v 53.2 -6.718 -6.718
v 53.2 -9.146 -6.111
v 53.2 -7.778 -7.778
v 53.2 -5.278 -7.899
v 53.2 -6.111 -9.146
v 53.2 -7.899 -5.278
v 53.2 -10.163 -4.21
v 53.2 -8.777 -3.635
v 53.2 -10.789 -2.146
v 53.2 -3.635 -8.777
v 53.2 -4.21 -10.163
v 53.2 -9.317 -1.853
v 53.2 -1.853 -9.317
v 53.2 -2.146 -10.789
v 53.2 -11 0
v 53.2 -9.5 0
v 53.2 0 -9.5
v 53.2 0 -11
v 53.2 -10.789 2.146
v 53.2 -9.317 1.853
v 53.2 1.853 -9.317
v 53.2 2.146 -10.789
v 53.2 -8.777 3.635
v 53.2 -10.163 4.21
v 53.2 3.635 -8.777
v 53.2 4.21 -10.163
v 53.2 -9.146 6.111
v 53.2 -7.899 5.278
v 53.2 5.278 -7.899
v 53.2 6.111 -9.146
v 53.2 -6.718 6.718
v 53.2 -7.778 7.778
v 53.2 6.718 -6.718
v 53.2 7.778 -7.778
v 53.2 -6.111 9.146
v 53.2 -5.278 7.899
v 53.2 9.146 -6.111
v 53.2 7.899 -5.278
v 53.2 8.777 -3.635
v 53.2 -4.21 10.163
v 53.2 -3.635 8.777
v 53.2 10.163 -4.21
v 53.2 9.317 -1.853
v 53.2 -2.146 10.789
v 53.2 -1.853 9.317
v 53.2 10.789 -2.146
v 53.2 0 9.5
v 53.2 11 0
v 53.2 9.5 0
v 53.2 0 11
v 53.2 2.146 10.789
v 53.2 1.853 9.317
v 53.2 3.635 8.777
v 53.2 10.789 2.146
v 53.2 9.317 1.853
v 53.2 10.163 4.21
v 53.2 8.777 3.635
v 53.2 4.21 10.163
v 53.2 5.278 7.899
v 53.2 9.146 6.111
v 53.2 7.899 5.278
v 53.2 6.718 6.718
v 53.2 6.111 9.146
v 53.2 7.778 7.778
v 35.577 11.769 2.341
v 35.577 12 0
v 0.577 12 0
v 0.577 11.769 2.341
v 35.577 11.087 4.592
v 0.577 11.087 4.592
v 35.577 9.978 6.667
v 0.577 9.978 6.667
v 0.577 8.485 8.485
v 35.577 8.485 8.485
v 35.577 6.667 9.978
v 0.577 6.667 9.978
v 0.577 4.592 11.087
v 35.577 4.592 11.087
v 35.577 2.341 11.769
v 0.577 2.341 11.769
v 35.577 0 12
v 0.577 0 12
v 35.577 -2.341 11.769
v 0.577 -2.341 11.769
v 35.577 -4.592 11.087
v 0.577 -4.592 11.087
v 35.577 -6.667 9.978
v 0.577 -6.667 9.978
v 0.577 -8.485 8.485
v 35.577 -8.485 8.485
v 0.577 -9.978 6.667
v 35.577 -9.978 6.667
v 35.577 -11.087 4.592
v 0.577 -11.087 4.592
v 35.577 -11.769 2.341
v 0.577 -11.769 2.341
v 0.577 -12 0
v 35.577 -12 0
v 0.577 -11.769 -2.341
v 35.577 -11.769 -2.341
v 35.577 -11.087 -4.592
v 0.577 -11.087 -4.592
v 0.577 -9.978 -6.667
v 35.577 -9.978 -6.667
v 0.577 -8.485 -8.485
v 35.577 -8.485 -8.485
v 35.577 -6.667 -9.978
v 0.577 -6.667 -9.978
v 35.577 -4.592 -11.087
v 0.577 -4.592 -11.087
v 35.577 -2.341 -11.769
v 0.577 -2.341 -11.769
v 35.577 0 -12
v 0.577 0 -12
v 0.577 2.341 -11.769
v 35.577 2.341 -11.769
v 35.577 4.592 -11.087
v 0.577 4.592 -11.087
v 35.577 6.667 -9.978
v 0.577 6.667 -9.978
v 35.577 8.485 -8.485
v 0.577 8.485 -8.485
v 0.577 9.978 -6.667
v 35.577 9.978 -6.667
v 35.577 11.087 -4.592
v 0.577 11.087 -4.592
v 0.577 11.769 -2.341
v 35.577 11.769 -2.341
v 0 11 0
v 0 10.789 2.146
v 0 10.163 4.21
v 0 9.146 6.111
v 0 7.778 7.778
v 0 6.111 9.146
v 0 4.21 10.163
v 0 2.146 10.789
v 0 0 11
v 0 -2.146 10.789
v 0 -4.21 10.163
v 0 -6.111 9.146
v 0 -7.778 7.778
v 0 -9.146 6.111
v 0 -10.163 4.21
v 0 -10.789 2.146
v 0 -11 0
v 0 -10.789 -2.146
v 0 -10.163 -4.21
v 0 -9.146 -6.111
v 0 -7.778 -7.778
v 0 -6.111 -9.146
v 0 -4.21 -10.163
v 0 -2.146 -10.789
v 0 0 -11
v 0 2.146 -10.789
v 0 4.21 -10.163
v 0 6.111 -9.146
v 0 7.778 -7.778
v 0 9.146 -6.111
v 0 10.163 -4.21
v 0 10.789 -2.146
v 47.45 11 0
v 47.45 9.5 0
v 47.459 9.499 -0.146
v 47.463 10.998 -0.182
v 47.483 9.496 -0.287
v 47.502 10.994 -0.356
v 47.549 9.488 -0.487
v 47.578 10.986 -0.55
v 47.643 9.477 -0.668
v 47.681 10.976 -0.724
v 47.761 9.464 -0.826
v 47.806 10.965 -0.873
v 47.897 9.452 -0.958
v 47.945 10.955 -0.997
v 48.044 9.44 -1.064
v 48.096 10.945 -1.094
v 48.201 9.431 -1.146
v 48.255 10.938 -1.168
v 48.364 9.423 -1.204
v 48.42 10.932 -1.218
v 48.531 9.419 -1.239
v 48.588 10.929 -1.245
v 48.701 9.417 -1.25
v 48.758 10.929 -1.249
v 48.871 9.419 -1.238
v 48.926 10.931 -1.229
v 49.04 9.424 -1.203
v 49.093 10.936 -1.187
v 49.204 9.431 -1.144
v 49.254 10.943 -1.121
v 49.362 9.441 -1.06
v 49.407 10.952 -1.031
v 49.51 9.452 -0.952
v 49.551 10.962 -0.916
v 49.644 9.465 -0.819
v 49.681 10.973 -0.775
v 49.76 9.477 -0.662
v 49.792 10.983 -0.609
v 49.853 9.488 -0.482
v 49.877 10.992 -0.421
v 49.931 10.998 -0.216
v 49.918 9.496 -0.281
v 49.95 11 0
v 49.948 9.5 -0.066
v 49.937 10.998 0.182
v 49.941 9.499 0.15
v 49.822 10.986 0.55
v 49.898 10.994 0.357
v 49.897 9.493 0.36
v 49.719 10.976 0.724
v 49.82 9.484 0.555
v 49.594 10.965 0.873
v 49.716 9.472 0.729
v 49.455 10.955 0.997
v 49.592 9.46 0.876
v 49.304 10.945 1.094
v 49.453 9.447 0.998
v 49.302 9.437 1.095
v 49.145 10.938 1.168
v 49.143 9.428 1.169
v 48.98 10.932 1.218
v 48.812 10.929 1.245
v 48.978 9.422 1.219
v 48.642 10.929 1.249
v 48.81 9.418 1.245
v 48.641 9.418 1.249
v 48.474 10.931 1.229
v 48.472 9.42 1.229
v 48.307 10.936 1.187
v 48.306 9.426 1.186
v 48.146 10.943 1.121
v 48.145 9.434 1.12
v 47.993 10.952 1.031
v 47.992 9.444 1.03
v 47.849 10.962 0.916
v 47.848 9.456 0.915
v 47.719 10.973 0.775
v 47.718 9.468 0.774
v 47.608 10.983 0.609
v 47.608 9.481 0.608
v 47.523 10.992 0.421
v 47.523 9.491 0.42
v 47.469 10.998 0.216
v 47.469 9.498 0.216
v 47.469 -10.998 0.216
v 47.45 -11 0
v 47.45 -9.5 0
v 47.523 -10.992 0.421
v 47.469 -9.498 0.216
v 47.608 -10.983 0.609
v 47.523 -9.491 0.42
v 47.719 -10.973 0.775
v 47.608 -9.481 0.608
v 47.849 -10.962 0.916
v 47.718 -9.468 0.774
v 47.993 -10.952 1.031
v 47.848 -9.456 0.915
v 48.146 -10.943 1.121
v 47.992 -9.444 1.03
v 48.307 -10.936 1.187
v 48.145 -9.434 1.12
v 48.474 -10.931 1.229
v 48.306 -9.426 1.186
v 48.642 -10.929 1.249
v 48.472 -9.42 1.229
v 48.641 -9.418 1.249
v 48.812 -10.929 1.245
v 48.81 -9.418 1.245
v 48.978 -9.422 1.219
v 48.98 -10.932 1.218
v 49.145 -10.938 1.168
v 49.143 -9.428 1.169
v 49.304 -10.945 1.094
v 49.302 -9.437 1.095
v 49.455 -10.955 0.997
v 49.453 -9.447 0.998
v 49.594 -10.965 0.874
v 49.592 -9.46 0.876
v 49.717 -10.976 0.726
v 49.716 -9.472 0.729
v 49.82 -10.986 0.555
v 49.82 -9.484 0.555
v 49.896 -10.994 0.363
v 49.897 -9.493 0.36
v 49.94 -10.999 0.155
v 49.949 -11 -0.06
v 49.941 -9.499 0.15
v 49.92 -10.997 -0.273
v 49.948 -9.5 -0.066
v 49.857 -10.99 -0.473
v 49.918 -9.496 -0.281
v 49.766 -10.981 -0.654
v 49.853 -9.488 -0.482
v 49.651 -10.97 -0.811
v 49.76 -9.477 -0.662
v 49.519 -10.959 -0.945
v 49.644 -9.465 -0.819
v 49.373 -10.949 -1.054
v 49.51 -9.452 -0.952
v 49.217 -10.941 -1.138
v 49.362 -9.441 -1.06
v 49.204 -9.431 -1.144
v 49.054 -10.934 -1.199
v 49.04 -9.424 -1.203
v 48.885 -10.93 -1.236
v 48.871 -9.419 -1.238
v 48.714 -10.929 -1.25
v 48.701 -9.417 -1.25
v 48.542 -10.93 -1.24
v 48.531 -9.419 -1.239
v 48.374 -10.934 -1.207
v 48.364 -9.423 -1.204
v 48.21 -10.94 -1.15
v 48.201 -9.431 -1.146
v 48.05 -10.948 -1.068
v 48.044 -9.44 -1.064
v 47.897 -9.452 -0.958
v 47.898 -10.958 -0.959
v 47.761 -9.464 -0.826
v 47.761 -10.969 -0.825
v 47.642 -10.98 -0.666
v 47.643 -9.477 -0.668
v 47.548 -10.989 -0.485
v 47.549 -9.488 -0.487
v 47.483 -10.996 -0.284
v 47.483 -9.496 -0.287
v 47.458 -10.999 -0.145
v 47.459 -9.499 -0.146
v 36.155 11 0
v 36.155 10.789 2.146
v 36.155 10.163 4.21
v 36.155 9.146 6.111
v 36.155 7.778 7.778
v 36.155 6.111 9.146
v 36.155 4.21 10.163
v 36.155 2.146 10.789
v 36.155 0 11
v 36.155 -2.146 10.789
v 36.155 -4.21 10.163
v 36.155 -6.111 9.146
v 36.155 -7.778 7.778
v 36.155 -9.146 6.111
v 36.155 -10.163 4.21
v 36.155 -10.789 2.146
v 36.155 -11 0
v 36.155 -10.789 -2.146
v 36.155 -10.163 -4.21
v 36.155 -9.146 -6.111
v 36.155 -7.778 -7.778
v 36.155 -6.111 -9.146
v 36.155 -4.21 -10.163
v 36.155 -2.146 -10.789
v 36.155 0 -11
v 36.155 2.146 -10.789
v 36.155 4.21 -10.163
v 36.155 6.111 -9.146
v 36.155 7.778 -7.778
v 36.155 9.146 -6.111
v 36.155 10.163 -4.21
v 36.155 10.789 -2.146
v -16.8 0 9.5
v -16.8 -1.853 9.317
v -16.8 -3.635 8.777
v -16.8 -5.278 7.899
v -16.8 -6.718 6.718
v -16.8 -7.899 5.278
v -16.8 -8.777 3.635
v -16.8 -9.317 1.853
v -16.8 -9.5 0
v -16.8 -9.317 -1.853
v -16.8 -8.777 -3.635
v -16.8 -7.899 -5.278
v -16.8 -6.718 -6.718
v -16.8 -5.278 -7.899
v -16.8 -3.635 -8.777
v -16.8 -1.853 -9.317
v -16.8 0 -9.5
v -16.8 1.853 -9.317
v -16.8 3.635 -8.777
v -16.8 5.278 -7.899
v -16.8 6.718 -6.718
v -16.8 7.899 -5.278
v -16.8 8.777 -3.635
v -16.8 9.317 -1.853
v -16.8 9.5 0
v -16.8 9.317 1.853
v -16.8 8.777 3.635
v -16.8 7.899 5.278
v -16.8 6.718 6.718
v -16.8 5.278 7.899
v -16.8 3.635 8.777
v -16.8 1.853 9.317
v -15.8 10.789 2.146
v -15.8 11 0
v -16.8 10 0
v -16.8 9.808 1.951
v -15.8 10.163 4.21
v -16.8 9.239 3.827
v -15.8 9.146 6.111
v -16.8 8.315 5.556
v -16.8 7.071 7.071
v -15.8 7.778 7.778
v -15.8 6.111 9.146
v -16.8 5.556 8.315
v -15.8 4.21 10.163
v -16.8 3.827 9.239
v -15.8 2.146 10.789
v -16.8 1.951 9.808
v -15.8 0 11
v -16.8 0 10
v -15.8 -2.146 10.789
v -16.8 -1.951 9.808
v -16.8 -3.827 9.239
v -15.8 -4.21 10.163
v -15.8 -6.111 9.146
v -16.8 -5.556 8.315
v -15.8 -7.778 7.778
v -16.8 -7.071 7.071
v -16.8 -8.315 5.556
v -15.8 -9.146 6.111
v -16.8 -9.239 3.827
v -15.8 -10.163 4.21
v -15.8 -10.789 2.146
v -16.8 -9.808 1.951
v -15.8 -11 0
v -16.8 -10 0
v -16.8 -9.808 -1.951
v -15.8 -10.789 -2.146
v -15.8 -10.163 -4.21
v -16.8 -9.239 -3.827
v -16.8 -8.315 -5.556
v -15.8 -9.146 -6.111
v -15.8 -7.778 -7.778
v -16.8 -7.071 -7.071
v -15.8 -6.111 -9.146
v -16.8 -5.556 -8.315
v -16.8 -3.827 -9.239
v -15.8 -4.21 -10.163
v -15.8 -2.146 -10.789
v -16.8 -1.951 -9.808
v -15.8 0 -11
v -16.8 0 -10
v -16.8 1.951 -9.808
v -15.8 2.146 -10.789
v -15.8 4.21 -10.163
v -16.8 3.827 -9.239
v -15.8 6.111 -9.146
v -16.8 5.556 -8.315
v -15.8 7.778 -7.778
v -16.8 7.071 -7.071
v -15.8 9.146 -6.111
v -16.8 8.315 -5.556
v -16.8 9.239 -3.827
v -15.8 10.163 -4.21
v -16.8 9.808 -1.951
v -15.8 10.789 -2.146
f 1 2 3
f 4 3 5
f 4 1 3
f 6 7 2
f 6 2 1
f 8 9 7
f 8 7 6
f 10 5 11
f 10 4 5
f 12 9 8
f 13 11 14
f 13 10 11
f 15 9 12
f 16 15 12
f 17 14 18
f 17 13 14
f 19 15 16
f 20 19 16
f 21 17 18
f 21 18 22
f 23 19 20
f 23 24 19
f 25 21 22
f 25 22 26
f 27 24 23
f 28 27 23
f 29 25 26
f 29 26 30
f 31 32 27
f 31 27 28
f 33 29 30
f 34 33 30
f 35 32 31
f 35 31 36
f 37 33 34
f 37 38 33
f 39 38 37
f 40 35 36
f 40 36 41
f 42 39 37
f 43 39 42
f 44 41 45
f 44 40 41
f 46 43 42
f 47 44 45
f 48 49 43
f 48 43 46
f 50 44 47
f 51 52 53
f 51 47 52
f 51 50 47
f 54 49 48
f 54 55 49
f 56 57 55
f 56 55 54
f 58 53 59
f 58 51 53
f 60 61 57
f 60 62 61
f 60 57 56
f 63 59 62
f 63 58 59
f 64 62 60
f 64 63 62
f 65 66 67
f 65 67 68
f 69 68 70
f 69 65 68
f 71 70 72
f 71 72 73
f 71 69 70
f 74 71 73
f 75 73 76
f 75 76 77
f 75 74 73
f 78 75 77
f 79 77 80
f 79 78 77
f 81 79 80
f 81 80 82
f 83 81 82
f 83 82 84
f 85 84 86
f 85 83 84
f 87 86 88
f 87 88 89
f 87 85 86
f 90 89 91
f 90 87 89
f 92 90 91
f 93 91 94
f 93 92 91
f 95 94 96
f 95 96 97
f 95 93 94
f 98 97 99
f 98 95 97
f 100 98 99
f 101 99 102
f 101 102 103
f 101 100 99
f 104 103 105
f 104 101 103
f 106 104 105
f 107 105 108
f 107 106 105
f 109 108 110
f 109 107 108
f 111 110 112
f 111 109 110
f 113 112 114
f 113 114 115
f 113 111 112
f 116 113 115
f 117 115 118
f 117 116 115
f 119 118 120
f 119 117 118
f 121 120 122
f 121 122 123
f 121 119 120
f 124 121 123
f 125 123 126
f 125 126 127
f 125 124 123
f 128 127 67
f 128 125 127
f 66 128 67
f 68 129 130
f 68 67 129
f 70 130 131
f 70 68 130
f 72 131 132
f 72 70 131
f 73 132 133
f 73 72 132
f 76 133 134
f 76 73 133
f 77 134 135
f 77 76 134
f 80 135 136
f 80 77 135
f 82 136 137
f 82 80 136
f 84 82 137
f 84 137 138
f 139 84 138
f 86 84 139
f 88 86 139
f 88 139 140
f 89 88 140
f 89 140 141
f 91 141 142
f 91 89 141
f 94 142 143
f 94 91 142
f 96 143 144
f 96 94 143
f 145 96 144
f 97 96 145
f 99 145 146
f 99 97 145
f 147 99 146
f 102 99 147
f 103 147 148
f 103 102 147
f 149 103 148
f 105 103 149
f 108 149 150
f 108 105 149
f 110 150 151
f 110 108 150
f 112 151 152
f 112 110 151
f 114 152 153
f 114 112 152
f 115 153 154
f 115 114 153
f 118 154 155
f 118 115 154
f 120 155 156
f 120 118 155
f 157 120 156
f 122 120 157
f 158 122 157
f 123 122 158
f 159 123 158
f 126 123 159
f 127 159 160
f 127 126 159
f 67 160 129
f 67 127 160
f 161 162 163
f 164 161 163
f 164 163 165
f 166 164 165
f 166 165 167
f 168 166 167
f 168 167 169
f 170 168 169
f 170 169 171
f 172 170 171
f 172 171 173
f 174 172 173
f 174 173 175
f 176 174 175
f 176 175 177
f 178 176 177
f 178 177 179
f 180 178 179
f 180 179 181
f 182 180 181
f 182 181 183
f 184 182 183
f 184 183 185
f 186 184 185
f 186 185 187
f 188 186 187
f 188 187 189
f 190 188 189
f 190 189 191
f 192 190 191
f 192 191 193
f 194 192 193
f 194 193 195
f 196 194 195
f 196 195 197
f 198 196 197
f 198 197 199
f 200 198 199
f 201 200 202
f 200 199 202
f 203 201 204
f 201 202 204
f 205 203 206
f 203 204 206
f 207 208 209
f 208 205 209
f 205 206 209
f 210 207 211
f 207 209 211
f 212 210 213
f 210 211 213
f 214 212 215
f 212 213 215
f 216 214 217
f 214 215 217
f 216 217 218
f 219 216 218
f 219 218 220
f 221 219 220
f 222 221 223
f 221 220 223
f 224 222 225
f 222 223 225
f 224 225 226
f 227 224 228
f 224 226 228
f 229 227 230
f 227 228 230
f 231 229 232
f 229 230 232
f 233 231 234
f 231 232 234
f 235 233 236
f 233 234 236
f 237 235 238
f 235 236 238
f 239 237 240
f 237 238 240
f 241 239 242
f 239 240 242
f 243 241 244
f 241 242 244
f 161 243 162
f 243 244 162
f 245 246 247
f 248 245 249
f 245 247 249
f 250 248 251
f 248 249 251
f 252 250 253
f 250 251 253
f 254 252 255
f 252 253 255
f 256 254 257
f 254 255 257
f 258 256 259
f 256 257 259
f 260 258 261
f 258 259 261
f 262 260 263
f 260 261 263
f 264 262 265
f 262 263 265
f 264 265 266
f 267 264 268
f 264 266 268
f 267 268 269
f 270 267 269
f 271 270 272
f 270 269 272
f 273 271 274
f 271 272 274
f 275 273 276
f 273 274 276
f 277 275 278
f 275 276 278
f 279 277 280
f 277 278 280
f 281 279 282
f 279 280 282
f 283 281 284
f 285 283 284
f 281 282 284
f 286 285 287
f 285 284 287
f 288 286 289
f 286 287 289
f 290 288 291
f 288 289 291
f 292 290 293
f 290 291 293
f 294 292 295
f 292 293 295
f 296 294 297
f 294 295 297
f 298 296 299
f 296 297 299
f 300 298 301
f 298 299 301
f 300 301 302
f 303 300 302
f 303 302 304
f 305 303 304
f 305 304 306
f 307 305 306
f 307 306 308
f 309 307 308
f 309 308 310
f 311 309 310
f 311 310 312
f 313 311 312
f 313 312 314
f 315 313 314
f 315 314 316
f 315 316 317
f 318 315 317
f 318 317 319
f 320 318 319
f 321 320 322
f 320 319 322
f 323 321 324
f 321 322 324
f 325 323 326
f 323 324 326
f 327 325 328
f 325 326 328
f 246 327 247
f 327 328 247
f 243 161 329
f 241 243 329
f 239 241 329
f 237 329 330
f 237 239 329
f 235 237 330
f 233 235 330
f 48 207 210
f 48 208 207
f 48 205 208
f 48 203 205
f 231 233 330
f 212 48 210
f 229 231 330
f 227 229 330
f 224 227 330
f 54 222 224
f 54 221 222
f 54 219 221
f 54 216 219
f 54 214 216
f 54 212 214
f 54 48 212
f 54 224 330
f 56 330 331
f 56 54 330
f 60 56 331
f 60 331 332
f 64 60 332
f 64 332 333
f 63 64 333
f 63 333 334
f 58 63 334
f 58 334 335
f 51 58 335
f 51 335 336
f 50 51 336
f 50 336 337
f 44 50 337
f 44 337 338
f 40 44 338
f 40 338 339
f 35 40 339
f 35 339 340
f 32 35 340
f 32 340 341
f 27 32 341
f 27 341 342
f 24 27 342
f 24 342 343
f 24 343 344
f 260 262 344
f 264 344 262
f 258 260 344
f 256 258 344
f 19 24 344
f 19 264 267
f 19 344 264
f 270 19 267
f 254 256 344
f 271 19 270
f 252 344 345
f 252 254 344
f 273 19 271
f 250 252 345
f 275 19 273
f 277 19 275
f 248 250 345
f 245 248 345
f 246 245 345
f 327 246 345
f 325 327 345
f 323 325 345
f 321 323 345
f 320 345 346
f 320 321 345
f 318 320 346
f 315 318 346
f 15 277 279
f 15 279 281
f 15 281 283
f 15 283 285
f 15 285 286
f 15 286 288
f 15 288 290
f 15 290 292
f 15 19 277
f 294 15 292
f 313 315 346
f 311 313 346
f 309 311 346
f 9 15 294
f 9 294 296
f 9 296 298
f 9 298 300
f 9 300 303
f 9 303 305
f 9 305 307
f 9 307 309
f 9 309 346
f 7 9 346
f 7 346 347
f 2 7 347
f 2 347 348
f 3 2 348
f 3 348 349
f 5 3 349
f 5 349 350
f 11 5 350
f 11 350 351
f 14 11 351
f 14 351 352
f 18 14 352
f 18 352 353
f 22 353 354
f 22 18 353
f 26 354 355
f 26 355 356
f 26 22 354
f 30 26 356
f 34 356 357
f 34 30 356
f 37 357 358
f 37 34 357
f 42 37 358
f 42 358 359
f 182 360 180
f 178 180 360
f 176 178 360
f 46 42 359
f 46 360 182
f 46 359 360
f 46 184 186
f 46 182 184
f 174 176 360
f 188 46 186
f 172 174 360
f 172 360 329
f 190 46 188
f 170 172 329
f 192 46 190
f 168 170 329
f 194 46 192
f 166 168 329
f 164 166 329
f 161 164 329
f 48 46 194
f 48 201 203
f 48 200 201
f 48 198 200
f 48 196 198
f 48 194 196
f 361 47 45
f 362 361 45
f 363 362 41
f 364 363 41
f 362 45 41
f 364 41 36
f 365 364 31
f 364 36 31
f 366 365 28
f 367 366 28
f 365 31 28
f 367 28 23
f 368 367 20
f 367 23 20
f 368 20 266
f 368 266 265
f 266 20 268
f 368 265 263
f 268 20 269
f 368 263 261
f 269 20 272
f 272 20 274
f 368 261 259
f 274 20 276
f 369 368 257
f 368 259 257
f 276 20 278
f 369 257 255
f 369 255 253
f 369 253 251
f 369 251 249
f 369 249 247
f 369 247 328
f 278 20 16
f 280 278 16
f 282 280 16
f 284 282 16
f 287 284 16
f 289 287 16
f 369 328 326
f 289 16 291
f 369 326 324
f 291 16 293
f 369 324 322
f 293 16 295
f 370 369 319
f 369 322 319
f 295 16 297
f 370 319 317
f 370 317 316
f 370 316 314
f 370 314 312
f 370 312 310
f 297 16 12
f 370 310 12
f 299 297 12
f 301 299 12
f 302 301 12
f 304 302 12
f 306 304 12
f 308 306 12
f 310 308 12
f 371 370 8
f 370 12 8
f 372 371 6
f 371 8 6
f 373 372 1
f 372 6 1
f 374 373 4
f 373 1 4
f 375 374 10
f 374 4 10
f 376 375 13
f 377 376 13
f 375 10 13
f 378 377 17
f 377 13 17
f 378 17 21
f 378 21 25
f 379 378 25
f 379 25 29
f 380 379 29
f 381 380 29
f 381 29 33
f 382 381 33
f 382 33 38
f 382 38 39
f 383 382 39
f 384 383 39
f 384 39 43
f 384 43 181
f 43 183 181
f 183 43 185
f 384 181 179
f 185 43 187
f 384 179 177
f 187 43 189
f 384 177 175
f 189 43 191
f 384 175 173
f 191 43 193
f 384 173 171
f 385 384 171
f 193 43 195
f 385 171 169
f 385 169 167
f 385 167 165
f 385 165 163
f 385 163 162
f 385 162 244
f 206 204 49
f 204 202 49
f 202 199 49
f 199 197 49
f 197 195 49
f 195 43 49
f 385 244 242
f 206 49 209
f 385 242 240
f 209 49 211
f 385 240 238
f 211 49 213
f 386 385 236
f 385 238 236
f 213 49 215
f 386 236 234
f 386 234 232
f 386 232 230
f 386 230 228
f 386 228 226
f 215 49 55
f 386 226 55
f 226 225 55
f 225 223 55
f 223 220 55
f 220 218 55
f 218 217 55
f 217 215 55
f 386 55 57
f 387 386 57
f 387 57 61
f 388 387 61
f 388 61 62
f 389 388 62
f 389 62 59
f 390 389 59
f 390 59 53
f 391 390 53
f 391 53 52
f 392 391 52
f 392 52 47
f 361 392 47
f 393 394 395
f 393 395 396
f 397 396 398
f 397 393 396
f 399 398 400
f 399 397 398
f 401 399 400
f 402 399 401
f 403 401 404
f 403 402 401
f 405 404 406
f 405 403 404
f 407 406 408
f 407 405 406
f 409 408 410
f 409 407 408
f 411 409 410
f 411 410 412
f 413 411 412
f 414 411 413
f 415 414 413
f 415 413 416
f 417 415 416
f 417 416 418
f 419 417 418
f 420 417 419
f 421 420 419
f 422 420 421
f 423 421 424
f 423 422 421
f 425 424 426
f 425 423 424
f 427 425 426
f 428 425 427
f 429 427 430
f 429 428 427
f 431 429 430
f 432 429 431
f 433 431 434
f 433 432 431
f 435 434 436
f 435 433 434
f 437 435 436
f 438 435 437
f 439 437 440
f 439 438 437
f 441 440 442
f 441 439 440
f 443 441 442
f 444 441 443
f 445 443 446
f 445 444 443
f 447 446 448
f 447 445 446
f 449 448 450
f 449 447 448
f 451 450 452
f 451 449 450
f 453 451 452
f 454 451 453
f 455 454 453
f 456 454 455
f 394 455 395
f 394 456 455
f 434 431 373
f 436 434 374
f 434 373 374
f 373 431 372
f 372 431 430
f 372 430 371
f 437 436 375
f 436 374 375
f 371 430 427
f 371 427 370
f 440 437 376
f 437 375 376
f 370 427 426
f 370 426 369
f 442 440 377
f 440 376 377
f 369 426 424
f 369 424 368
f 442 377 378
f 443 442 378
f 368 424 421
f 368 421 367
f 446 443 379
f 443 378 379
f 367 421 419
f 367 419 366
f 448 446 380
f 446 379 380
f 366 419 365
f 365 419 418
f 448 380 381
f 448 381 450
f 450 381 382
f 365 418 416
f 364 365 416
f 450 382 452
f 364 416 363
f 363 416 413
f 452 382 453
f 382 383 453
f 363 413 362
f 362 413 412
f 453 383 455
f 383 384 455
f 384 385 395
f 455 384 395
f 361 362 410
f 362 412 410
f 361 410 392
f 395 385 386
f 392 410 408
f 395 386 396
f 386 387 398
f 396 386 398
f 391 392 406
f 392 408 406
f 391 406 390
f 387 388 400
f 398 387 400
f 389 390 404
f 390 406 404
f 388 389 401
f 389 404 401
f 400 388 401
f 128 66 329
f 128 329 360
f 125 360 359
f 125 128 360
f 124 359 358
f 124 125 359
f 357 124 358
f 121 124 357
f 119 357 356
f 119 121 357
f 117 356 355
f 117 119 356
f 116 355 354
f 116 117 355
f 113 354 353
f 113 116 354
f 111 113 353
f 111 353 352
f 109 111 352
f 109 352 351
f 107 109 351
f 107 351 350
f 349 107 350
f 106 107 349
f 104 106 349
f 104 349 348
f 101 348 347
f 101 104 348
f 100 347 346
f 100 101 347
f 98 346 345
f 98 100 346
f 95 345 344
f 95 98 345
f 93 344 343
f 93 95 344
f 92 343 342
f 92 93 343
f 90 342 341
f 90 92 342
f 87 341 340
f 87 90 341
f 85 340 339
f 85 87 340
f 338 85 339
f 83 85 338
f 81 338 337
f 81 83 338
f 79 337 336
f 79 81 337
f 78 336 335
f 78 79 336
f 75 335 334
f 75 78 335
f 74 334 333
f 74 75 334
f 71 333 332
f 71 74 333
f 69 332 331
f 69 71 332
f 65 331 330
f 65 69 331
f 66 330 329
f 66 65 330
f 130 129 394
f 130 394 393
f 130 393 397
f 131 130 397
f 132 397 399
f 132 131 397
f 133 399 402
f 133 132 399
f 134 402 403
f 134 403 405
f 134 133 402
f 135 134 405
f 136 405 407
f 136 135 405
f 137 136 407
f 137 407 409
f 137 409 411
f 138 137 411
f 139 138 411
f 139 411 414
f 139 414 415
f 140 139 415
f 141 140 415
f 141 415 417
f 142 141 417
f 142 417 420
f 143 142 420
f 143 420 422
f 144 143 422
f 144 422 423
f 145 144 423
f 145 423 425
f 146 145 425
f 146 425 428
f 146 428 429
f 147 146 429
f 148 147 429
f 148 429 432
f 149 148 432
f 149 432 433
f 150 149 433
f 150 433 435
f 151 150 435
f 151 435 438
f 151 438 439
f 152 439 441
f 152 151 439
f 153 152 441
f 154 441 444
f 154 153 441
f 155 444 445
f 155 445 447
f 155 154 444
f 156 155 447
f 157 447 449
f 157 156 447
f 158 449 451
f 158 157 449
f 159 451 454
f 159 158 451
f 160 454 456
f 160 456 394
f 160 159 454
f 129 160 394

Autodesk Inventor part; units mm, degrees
ref_plane "YZ Plane" through (0, 0, 0) normal (1, 0, 0) x (0, 1, 0)
ref_plane "XZ Plane" through (0, 0, 0) normal (0, 1, 0) x (-1, 0, 0)
ref_plane "XY Plane" through (0, 0, 0) normal (0, 0, 1) x (1, 0, 0)
sketch "Profile" plane through (0, 0, 0) normal (0, 0, 1) x (1, 0, 0)
  line L0 (-16.8, 0) -> (-16.8, 11)
  line L1 (-16.8, 11) -> (0, 11)
  line L2 (0, 11) -> (0.5774, 12)
  line L3 (0.5774, 12) -> (35.5774, 12)
  line L4 (35.5774, 12) -> (36.1547, 11)
  line L5 (36.1547, 11) -> (53.2, 11)
  line L6 (53.2, 11) -> (53.2, 0)
  line L7 (-16.8, 0) -> (0, 0)
  line L8 (0, 0) -> (0, 9)
  line L9 (0, 9) -> (45.2, 9)
  line L10 (45.2, 9) -> (45.2, 0)
  line L11 (45.2, 0) -> (53.2, 0)
  line L12 (-30.8, 0) -> (67.2, 0) construction
  line L13 (0, 11) -> (0, 9) construction
  dimension "BodyLength" = 70
  dimension "d1" = 11
  dimension "d3" = 120
  dimension "d4" = 120
  dimension "d5" = 35
  dimension "d6" = 16.8
  dimension "d16" = 8
  dimension "d29" = 1
  dimension "d30" = 9
revolve "ProfileRevolveFeature" add sketch "Profile" angle 360 about axis through (-10, 0, 0) along (1, 0, 0)
sketch "InsideHole" plane through (-16.8, 0, 0) normal (-1, 0, 0) x (0, 0, 1)
  circle A0 centre (0, 0) radius 9 construction
hole "InsideHoleFeature" at (-16.8, 0, 0) direction (1, 0, 0) diameter 19 end through all
chamfer "EndChamferFeature" distance 1 angle 45 1 edges at (-16.8, -11, 0)
sketch "CapMountHole" plane through (0, 0, 0) normal (0, 1, 0) x (-1, 0, 0)
  line L0 (-53.2, 11) -> (-53.2, -11) construction
  line L1 (11.4, 0) -> (-68.4, 0) construction
  circle A0 centre (-48.7, 0) radius 1.25
  point P0 (0, 0)
  dimension "d31" = 4.5
  dimension "d39" = 2.5
extrude "CapMountHoleFeature" cut sketch "CapMountHole" along normal through all both and the other way through all
equation "\"d5\" = 0.5 * BodyLength"
equation "\"d6\" = 0.24 * BodyLength"
properties part number "BackPair1PistonBody"
